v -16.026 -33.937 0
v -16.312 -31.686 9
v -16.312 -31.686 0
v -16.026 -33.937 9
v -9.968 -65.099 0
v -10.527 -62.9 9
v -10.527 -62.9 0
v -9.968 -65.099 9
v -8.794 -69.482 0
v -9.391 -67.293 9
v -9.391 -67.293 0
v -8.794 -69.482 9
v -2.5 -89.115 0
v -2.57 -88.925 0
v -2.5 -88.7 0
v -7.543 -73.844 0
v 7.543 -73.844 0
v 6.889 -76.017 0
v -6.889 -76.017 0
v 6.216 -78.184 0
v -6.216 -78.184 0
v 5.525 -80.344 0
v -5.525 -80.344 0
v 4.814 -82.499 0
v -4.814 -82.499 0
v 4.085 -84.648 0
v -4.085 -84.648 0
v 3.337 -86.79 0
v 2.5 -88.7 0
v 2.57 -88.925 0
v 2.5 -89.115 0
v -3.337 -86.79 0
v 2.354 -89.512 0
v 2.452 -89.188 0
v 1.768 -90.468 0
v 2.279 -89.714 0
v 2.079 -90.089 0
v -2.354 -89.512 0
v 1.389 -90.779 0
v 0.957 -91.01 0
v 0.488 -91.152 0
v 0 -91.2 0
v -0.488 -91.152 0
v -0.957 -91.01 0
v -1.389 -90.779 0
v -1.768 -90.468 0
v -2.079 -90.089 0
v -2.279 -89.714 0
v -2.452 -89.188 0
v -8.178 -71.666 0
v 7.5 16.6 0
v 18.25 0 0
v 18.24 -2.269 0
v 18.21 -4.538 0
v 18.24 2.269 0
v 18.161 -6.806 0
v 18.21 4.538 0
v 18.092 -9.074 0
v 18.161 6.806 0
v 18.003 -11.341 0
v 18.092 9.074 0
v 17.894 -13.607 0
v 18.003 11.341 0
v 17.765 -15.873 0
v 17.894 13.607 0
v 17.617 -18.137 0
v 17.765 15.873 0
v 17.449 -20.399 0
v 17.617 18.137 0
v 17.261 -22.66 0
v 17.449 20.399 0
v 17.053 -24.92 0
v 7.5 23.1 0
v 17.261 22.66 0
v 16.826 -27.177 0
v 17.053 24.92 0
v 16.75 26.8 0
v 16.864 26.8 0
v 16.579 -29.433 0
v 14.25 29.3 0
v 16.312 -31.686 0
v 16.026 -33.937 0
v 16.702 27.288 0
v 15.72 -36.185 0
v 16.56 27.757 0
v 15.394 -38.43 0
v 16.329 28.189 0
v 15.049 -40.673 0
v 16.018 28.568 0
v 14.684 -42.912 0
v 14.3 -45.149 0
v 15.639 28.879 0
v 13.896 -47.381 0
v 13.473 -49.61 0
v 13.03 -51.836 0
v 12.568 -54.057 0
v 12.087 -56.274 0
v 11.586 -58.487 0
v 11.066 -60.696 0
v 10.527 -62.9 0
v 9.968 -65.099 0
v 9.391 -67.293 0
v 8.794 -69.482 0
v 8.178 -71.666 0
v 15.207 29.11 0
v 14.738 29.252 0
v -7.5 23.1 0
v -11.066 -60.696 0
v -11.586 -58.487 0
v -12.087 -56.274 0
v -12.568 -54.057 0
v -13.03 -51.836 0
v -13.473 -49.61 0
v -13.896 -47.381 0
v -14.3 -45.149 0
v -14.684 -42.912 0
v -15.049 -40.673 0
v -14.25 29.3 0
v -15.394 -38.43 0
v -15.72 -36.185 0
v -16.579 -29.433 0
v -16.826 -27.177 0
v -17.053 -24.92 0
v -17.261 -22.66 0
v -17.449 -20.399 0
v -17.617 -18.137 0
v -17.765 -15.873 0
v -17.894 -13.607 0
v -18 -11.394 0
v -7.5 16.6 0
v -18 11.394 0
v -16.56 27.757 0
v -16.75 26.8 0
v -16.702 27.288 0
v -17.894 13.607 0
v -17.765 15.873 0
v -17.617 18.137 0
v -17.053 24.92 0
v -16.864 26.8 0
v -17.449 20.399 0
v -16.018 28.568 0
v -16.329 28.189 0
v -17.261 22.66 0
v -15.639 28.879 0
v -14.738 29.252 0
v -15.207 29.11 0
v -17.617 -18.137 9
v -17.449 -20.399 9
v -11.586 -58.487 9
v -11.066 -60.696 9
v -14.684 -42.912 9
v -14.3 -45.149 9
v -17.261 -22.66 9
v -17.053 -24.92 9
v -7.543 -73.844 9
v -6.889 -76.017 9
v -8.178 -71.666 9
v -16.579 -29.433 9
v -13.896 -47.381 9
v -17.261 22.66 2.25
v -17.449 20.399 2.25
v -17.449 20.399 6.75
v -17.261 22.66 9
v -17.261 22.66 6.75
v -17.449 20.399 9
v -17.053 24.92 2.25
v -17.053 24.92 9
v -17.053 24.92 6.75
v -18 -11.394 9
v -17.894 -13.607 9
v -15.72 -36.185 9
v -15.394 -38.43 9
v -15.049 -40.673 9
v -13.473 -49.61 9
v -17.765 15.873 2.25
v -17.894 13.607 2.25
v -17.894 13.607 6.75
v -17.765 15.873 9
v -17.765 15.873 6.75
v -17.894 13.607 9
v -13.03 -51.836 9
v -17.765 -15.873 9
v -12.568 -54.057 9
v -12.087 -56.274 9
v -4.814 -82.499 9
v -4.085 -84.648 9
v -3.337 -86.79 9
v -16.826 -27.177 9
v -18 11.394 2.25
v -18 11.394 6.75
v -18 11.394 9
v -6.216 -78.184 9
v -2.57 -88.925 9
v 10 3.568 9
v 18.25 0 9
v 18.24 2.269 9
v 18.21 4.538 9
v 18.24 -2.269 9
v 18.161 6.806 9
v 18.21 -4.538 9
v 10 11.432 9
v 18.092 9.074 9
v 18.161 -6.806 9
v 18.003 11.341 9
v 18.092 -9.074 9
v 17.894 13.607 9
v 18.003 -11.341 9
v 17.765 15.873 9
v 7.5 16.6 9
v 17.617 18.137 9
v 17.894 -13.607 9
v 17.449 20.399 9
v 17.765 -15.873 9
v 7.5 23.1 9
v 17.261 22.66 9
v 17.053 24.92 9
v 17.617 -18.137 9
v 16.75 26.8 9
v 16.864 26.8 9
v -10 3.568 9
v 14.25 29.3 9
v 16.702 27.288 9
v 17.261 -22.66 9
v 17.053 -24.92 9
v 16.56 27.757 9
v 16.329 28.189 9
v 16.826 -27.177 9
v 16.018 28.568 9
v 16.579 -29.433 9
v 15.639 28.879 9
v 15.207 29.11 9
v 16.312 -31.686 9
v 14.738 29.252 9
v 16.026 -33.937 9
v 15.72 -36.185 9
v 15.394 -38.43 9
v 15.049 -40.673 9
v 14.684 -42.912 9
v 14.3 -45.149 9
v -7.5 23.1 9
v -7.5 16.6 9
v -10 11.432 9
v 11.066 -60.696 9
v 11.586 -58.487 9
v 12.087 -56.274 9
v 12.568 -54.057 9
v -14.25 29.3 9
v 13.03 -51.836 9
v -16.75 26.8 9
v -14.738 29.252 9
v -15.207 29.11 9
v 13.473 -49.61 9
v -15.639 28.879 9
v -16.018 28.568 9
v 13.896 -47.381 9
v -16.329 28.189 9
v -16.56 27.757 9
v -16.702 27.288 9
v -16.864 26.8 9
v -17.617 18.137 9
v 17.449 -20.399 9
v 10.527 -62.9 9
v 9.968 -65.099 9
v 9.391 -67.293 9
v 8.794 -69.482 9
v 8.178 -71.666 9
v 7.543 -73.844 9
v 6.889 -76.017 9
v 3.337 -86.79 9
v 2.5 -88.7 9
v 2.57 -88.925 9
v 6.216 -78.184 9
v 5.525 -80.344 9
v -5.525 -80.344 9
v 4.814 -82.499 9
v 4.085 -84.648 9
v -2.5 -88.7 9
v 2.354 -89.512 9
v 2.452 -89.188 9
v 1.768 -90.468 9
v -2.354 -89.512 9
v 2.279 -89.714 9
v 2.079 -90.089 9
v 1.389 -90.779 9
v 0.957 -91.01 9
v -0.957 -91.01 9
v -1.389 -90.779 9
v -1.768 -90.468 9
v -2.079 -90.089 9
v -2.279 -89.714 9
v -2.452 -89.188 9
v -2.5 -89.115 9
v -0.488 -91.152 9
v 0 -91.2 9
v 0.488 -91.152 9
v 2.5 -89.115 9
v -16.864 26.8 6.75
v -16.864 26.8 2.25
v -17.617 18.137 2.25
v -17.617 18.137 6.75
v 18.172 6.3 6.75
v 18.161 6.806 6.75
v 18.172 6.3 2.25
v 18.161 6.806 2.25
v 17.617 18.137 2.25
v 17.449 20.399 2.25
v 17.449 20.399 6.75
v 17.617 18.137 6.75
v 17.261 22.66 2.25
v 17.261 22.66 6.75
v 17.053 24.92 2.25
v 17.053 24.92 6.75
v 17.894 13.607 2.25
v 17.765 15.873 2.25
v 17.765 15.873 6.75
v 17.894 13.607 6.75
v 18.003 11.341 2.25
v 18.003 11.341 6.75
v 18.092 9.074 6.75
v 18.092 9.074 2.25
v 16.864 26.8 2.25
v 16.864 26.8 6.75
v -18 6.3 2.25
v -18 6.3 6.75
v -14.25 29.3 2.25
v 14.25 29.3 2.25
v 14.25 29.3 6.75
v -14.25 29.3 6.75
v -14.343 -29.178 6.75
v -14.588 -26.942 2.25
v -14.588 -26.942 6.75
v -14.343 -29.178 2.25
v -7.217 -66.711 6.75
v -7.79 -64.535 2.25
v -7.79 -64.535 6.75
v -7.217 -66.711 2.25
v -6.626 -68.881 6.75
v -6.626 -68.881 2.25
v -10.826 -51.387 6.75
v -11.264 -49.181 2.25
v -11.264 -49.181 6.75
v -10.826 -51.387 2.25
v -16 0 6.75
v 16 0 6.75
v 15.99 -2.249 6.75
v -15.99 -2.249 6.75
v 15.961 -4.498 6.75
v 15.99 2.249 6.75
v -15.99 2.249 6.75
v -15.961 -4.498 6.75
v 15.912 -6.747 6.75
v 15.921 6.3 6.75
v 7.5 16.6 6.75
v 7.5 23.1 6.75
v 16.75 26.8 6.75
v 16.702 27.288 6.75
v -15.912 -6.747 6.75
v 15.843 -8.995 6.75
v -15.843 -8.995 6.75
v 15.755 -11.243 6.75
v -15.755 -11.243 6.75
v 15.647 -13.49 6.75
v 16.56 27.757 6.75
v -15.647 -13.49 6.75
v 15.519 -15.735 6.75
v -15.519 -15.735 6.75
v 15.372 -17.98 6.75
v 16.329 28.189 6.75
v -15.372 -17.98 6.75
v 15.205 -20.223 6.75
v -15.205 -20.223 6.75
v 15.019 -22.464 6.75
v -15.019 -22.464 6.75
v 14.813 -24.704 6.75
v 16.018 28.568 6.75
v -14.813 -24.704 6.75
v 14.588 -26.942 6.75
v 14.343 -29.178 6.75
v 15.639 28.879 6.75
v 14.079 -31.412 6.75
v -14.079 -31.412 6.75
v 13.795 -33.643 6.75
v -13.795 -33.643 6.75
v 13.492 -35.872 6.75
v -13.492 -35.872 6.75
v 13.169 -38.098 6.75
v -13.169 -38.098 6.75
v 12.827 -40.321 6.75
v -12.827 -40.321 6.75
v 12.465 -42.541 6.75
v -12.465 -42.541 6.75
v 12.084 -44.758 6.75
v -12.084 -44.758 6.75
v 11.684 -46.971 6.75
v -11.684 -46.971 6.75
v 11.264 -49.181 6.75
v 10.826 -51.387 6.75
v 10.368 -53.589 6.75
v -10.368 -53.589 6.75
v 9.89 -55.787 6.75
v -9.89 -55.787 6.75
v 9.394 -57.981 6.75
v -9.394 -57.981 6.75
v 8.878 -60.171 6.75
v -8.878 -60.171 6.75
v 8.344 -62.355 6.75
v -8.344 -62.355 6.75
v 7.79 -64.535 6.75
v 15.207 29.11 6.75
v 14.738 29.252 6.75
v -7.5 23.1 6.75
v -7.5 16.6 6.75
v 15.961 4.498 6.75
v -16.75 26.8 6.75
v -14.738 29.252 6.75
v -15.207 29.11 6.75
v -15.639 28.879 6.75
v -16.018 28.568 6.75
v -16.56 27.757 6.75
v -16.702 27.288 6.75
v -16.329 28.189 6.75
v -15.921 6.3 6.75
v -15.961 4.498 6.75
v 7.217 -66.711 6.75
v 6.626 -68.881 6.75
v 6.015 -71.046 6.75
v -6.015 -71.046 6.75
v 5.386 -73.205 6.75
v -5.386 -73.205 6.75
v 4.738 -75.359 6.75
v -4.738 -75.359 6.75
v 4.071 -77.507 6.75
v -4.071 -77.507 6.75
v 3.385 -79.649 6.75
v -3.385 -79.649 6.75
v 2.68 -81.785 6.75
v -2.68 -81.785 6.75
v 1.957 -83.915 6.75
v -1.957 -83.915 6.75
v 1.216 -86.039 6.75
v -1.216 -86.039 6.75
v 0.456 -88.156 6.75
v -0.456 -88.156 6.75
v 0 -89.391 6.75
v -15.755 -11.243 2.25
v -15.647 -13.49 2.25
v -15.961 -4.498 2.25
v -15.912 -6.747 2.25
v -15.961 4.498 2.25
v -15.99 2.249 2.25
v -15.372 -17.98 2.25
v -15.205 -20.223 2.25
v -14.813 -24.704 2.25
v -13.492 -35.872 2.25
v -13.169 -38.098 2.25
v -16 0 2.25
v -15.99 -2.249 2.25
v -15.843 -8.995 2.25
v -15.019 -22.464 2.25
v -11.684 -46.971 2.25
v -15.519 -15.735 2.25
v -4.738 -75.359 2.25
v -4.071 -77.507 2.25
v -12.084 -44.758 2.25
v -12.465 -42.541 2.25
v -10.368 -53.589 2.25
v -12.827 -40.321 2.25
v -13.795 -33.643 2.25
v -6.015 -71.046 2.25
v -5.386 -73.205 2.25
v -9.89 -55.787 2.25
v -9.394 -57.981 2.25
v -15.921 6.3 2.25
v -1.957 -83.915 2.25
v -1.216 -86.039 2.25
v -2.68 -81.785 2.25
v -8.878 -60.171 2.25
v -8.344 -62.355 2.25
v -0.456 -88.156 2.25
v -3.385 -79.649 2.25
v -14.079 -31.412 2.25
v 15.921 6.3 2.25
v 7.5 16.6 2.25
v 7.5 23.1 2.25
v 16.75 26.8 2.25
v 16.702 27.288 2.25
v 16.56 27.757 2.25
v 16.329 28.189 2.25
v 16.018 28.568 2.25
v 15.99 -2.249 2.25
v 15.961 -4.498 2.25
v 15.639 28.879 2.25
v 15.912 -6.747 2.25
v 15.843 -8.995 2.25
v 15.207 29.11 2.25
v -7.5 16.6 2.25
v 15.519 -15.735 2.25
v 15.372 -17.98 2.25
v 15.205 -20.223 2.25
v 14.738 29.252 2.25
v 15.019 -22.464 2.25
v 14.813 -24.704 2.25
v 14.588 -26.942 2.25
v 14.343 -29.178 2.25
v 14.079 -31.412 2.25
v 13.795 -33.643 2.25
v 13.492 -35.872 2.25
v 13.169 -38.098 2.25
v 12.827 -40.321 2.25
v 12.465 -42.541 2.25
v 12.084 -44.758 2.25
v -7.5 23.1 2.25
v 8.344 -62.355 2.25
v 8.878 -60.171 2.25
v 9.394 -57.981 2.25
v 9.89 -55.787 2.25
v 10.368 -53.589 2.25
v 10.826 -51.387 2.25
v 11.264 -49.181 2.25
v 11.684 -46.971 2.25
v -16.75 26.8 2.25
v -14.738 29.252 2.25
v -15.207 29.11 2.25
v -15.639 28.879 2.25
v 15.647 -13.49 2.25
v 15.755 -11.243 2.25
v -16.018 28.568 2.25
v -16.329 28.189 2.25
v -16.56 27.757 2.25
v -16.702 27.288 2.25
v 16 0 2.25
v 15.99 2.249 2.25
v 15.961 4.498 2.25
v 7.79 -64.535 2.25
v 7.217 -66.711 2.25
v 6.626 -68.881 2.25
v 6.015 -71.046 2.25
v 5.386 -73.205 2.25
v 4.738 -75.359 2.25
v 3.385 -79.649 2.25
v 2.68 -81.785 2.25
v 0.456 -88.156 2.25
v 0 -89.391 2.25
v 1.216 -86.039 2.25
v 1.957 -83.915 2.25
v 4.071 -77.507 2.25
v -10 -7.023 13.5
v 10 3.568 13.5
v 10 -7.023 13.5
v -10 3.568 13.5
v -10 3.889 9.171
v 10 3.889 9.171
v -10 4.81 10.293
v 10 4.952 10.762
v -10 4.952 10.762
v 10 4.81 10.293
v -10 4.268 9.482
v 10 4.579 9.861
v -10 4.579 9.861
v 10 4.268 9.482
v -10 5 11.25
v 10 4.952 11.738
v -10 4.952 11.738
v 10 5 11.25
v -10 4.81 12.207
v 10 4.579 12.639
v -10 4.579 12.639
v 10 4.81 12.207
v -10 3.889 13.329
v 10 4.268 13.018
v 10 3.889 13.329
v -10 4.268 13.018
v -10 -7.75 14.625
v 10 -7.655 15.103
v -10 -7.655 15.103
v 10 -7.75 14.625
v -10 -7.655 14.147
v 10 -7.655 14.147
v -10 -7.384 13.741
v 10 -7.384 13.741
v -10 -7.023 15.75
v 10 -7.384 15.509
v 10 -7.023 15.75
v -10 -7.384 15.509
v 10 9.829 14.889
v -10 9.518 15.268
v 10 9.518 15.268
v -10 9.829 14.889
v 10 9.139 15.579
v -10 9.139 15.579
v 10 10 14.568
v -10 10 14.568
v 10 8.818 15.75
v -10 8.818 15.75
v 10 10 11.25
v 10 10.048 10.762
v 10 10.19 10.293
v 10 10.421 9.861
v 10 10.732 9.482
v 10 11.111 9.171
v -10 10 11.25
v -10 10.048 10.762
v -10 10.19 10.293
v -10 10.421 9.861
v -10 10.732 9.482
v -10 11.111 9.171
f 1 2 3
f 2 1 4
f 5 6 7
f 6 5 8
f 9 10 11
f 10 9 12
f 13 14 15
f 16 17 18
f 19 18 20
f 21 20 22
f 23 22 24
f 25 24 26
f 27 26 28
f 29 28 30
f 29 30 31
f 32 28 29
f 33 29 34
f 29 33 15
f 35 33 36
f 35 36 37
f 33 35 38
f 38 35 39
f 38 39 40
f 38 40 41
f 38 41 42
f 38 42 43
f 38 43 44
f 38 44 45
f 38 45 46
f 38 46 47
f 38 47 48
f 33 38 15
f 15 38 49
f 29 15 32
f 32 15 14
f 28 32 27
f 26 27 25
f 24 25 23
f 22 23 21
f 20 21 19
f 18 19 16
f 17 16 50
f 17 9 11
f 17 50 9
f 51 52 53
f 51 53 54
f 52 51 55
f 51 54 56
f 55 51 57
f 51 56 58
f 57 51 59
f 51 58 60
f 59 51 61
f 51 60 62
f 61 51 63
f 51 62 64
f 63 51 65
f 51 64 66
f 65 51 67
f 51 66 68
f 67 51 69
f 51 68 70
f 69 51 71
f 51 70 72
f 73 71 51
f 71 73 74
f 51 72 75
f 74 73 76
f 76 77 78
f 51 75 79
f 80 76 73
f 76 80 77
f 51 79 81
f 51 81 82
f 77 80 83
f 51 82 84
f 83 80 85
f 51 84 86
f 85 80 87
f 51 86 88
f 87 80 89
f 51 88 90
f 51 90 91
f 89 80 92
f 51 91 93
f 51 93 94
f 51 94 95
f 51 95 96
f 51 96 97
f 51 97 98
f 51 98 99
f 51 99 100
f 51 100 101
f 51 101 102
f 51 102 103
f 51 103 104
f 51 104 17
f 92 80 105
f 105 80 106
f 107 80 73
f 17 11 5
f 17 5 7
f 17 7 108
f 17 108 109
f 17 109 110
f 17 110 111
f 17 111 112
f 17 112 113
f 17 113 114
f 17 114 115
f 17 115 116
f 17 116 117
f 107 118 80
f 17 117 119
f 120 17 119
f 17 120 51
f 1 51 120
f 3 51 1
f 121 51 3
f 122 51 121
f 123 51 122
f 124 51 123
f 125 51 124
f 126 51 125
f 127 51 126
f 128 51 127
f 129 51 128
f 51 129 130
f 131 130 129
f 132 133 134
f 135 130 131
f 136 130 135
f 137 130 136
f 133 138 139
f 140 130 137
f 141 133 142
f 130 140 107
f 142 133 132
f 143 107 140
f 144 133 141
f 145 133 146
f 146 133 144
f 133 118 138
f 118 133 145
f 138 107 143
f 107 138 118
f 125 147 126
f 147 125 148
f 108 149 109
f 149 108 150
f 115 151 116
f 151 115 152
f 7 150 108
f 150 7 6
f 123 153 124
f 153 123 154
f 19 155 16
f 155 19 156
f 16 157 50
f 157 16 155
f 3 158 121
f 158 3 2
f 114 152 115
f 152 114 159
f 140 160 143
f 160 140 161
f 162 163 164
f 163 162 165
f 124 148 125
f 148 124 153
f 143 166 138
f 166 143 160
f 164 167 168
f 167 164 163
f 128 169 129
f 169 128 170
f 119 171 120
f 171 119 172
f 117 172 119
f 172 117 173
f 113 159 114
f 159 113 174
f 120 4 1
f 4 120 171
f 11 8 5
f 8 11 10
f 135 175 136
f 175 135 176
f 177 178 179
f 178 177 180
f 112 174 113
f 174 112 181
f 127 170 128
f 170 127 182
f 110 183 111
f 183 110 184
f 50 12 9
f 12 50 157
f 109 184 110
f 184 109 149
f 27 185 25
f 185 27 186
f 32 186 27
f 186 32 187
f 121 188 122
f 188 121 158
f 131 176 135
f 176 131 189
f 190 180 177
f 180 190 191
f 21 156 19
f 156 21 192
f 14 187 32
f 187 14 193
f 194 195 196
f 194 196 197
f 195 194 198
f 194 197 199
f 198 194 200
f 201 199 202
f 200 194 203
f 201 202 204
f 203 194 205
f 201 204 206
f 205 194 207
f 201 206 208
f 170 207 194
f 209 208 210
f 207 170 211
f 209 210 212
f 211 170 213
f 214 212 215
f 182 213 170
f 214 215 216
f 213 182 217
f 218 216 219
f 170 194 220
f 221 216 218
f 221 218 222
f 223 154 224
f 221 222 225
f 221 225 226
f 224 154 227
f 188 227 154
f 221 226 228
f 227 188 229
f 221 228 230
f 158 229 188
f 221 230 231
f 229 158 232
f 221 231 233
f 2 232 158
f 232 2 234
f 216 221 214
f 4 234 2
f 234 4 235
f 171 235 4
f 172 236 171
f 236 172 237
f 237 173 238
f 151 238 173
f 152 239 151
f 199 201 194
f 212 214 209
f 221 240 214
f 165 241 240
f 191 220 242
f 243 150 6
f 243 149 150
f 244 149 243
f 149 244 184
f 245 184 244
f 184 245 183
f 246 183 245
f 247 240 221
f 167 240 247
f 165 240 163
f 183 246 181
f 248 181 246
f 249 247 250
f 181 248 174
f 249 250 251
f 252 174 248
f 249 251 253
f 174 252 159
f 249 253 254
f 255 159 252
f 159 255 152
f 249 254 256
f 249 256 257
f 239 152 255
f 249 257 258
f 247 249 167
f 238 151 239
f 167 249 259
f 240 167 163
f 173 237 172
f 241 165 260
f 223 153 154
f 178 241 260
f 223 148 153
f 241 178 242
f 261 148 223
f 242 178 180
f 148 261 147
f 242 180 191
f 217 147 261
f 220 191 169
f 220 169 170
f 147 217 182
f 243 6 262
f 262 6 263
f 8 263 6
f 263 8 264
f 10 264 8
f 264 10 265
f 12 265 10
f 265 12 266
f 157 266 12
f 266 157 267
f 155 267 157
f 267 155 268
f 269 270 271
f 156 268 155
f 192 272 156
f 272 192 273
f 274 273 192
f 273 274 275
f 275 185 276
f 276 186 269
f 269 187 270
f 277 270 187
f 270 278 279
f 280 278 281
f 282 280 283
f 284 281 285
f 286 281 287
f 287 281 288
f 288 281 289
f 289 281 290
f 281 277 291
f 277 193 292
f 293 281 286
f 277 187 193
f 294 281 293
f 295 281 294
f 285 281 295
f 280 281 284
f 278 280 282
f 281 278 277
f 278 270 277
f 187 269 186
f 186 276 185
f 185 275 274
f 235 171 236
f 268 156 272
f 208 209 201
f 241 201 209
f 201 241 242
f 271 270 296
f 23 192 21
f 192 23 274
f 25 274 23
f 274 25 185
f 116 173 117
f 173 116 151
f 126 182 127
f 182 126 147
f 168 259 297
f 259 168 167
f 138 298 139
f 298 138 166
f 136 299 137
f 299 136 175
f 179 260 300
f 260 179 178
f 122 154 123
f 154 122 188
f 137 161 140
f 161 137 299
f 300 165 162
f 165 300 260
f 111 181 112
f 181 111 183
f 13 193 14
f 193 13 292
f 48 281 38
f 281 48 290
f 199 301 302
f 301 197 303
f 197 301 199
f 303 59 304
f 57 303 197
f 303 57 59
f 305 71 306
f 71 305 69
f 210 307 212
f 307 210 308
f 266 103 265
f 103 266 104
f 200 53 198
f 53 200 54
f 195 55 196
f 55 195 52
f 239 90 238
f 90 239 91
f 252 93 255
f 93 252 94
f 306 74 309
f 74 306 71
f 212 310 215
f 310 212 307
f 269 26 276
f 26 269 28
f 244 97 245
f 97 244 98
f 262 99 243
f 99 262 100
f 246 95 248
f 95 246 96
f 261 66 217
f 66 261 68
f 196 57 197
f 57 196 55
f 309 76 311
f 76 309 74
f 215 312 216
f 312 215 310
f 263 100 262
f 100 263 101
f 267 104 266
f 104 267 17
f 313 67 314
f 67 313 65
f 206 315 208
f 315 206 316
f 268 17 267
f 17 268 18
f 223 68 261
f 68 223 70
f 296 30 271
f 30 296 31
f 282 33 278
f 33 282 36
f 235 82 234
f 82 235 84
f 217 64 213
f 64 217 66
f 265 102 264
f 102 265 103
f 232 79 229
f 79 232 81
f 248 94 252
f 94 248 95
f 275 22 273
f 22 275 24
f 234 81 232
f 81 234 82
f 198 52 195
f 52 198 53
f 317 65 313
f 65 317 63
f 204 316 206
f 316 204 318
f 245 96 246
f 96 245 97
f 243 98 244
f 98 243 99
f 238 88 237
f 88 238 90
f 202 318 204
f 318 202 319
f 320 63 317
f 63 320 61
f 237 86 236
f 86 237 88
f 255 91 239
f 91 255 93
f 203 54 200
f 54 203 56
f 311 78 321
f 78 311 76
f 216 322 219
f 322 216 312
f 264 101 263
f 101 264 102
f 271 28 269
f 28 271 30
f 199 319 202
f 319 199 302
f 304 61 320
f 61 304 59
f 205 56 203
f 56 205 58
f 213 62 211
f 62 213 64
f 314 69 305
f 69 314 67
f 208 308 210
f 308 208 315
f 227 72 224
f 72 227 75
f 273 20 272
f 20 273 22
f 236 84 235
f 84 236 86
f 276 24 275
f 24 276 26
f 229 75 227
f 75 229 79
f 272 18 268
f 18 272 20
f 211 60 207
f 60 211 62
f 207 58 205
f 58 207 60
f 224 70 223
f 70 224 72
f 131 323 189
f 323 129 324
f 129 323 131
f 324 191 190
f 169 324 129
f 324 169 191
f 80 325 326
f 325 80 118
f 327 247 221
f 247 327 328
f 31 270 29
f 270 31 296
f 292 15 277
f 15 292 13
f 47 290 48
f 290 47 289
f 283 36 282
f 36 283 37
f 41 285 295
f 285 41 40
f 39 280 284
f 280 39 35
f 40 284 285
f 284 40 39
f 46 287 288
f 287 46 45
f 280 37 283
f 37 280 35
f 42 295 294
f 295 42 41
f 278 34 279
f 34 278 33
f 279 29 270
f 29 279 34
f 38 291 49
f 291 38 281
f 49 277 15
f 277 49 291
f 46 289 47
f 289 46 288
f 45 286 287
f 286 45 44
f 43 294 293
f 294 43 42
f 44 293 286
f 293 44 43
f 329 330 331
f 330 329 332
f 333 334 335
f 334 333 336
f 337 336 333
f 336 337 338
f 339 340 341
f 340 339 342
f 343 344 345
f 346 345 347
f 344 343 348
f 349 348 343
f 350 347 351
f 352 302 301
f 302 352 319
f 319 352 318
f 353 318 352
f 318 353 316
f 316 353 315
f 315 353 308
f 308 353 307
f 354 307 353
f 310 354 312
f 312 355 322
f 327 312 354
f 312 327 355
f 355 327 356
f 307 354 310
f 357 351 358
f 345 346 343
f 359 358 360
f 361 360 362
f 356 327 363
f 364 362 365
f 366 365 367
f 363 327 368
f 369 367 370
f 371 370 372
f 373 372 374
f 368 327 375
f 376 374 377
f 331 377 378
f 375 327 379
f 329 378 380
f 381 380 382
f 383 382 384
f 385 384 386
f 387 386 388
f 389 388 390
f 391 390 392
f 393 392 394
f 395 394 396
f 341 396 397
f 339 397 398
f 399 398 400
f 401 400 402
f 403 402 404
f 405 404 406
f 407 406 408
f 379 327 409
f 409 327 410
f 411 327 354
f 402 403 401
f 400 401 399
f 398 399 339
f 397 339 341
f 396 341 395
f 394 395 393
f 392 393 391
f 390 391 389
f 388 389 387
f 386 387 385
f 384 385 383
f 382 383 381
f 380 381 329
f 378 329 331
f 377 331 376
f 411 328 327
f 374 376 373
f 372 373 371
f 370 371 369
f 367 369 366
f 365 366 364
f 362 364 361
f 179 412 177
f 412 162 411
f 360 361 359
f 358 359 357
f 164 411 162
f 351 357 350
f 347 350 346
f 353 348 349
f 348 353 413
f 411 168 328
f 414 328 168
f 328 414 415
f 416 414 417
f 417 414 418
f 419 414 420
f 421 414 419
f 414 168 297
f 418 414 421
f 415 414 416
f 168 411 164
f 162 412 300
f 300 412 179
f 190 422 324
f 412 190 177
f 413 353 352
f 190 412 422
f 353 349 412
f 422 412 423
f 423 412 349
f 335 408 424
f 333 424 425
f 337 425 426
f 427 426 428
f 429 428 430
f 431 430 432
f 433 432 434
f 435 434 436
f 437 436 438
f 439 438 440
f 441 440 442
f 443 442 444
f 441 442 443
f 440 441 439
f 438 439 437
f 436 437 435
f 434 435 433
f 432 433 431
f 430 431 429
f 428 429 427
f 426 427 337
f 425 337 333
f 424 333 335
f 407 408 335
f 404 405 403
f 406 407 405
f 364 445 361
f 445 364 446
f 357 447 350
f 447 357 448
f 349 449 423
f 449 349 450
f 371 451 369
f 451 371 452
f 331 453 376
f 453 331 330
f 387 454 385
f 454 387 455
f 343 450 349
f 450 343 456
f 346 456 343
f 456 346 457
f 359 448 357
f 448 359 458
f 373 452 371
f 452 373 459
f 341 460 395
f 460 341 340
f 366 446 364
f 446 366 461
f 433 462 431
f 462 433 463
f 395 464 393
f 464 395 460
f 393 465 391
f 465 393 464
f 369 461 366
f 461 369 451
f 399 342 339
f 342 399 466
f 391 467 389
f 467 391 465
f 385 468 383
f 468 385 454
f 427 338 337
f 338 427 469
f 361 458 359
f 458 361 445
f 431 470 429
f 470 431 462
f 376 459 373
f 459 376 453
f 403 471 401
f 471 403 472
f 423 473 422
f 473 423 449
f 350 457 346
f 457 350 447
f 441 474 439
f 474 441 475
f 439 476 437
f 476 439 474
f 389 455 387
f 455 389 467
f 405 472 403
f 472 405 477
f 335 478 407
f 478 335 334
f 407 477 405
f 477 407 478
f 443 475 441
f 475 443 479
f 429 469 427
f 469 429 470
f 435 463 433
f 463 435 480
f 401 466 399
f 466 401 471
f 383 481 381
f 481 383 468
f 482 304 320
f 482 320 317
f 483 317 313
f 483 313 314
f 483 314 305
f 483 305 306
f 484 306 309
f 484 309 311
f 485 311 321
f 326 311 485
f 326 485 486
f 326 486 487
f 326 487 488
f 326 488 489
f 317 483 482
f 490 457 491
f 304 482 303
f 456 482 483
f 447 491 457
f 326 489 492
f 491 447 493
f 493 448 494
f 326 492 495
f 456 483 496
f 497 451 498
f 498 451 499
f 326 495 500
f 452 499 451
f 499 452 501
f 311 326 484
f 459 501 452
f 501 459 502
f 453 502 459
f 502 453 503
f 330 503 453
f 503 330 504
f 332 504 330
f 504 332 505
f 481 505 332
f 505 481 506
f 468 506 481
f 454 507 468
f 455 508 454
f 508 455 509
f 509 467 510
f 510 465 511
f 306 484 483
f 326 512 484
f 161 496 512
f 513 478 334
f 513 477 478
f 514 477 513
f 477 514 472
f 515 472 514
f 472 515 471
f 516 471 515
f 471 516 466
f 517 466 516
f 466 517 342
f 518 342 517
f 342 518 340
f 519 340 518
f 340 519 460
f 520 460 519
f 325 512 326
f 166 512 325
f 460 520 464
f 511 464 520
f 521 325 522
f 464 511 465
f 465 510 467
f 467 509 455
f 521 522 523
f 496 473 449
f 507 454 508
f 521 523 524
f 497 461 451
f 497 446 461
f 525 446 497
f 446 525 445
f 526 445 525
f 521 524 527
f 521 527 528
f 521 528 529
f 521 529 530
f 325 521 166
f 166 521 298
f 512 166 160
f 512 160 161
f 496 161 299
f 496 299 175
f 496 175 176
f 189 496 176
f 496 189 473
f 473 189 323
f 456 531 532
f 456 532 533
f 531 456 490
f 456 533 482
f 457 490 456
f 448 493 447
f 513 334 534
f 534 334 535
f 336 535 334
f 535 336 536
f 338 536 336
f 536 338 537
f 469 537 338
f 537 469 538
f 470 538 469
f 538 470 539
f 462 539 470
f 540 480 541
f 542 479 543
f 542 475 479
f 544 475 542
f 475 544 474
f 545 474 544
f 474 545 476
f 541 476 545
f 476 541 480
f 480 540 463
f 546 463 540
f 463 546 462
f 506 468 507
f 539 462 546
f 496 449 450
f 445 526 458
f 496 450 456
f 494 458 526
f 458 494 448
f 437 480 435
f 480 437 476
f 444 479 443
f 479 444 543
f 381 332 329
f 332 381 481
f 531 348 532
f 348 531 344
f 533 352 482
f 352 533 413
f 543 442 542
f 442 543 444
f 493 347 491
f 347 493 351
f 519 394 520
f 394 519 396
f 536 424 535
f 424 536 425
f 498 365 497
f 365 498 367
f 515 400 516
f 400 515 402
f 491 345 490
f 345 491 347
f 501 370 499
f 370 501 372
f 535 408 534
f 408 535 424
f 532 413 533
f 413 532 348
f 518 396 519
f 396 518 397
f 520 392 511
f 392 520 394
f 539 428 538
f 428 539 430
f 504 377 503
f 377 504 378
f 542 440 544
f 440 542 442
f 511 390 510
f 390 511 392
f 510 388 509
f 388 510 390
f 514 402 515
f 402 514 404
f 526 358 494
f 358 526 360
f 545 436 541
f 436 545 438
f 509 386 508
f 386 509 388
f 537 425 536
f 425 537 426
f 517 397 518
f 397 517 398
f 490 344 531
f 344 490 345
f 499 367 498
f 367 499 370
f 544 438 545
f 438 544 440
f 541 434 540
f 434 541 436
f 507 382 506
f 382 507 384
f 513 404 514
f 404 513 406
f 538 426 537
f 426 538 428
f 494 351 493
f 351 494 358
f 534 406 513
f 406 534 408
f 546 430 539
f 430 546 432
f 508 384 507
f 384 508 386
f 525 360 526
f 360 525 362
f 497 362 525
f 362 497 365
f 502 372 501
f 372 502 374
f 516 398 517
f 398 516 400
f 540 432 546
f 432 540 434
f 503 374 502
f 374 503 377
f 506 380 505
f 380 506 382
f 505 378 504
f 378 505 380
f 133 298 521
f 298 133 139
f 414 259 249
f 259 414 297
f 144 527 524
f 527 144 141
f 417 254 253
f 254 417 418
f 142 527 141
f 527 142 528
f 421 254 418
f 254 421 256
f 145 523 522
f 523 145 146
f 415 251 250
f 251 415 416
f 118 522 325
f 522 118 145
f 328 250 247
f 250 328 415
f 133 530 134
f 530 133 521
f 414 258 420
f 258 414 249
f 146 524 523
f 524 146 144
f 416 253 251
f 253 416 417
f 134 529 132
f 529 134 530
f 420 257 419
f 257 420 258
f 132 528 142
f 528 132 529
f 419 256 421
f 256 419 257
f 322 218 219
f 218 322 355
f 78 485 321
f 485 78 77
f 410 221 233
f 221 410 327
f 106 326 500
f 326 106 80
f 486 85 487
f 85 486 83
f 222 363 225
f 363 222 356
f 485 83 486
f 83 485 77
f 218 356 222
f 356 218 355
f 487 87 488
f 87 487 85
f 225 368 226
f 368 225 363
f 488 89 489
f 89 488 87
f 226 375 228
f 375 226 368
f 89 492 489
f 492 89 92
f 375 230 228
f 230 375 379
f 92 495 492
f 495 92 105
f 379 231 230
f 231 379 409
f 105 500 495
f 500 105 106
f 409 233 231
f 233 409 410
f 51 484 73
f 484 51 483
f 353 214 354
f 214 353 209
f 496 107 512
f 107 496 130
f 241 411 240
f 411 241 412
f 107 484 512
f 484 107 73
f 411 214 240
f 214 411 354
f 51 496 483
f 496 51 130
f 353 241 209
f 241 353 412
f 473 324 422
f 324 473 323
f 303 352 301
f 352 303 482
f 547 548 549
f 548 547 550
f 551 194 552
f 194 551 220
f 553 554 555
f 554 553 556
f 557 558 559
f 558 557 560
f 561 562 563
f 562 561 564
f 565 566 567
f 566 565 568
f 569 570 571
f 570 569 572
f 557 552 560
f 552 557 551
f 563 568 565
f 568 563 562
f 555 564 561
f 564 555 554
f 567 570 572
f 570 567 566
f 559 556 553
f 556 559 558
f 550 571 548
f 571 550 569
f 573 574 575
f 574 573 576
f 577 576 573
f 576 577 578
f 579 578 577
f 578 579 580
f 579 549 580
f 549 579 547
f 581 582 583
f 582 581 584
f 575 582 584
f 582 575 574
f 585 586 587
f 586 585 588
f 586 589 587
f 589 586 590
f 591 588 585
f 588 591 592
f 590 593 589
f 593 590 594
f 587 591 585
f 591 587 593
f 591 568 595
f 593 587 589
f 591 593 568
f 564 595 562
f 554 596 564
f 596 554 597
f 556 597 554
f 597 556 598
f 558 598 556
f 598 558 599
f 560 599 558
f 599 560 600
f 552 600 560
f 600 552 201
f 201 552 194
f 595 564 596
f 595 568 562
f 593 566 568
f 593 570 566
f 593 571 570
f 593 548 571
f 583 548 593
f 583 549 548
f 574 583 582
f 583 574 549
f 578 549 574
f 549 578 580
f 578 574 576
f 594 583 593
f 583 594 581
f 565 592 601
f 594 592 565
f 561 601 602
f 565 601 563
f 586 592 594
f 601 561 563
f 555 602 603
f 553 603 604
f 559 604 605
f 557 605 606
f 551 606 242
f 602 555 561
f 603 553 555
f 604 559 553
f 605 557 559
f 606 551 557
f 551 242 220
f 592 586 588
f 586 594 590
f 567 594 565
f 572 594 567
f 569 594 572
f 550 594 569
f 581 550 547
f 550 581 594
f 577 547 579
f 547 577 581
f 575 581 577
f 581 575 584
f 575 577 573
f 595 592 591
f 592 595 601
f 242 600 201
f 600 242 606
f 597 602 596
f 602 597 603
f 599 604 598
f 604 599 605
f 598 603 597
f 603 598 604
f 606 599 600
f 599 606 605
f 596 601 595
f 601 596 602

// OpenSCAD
$fa=0.5; // default minimum facet angle is now 0.5
$fs=0.5; // default minimum facet size is now 0.5 mm

lengthFromOrigin = 95.7;
fullLength = 125;
fullThickness = 9;
arcRadius = 260;
thickestWidth = 36.5;
centerToHole = 16.6;
holeLength = 15;
holeWidth = 6.5;
wallThickness = 2.25;
centerToTop = fullLength - lengthFromOrigin;
gapDepth = 23;
centerToGap = centerToTop - gapDepth;

union() {
  difference() {
    intersection() {
      translate([(arcRadius - thickestWidth / 2), 0, 0]) {
        cylinder(h=fullThickness, r=arcRadius, center=false);
      }
      translate([-1 * (arcRadius - thickestWidth / 2), 0, 0]) {
        cylinder(h=fullThickness, r=arcRadius, center=false);
      }
      translate([(-2 * fullThickness),(lengthFromOrigin * -1),0]) {
        cube([thickestWidth, fullLength, fullThickness]);
      }
    }
    translate([0, (lengthFromOrigin * -1) + 7, 0]) {
      difference() {
        translate([-2.5, -10, -1]) {
          cube([5, 10, fullThickness + 2]);
        }
        translate([0, 0, -2]) {
          cylinder(h=fullThickness + 4, r=2.5, center=false);
        }
      }
    }
    translate([holeLength / -2, centerToHole, -1]) {
      cube([holeLength, holeWidth, fullThickness + 2]);
    }
    translate([-25, centerToGap, wallThickness]) {
      cube([50, gapDepth + 1, (fullThickness - 2*wallThickness)]);
    }
    intersection() {
      translate([(arcRadius - thickestWidth / 2), 0, wallThickness]) {
        cylinder(h=fullThickness - (2 * wallThickness), r=arcRadius - wallThickness, center=false);
      }
      translate([-1 * (arcRadius - thickestWidth / 2), 0, wallThickness]) {
        cylinder(h=fullThickness - (2 * wallThickness), r=arcRadius - wallThickness, center=false);
      }
    }
    translate([(thickestWidth / -2) + 4, centerToTop - 2.5, -1]) {
      difference() {
        translate([-5,0,0]) {
          cube([5, 5, fullThickness + 2]);
        }
        cylinder(h=fullThickness + 2, r=2.5, center=false);
      }
    }
    translate([(thickestWidth / 2) - 4, centerToTop - 2.5, -1]) {
      difference() {
        cube([5, 5, fullThickness + 2]);
        cylinder(h=fullThickness + 2, r=2.5, center=false);
      }
    }
  }

  // Belt Clip
  clipLength = 20; // Relative to Y axis

  translate([-10, 10 - clipLength, fullThickness]) {
    difference() {
      cube([20, clipLength, fullThickness - wallThickness]);
      translate([-1, -4.5, 0]) {
        intersection() {
          cube([22, clipLength + 2, 4.5]);
          translate([0, clipLength - 3, 2.25]) {
            rotate([0, 90, 0]) {
              cylinder(h=25, r=2.5, center=false);
            }
          }
        }
      }
      translate([-1, fullThickness/-2, 0]) {
          cube([22, clipLength - 3, fullThickness/2]);
      }
      translate([-2.5, 3.5, (fullThickness  + wallThickness) / 2]) {
        difference() {
          translate([0, -5, -2.5]) {
            cube([25, 5, 5]);
          }
          rotate([0, 90, 0]) {
            cylinder(h=25, r=1.25, center=false);
          }
        }
      }
      translate([-2.5, clipLength - wallThickness, wallThickness * 2]) {
        difference() {
          cube([25, 2.5, 2.5]);
          rotate([0, 90, 0]) {
            cylinder(h=25, r=2.5, center=false);
          }
        }
      }
    }
    translate([0, clipLength + 2.5, wallThickness]) {
      difference() {
        translate([0, -2.5, -2.5]) {
          cube([20, 2.5, 2.5]);
        }
        translate([-2.5, 0, 0]) {
          rotate([0, 90, 0]) {
            cylinder(h=25, r=2.5, center=false);
          }
        }
      }
    }
  }
}
